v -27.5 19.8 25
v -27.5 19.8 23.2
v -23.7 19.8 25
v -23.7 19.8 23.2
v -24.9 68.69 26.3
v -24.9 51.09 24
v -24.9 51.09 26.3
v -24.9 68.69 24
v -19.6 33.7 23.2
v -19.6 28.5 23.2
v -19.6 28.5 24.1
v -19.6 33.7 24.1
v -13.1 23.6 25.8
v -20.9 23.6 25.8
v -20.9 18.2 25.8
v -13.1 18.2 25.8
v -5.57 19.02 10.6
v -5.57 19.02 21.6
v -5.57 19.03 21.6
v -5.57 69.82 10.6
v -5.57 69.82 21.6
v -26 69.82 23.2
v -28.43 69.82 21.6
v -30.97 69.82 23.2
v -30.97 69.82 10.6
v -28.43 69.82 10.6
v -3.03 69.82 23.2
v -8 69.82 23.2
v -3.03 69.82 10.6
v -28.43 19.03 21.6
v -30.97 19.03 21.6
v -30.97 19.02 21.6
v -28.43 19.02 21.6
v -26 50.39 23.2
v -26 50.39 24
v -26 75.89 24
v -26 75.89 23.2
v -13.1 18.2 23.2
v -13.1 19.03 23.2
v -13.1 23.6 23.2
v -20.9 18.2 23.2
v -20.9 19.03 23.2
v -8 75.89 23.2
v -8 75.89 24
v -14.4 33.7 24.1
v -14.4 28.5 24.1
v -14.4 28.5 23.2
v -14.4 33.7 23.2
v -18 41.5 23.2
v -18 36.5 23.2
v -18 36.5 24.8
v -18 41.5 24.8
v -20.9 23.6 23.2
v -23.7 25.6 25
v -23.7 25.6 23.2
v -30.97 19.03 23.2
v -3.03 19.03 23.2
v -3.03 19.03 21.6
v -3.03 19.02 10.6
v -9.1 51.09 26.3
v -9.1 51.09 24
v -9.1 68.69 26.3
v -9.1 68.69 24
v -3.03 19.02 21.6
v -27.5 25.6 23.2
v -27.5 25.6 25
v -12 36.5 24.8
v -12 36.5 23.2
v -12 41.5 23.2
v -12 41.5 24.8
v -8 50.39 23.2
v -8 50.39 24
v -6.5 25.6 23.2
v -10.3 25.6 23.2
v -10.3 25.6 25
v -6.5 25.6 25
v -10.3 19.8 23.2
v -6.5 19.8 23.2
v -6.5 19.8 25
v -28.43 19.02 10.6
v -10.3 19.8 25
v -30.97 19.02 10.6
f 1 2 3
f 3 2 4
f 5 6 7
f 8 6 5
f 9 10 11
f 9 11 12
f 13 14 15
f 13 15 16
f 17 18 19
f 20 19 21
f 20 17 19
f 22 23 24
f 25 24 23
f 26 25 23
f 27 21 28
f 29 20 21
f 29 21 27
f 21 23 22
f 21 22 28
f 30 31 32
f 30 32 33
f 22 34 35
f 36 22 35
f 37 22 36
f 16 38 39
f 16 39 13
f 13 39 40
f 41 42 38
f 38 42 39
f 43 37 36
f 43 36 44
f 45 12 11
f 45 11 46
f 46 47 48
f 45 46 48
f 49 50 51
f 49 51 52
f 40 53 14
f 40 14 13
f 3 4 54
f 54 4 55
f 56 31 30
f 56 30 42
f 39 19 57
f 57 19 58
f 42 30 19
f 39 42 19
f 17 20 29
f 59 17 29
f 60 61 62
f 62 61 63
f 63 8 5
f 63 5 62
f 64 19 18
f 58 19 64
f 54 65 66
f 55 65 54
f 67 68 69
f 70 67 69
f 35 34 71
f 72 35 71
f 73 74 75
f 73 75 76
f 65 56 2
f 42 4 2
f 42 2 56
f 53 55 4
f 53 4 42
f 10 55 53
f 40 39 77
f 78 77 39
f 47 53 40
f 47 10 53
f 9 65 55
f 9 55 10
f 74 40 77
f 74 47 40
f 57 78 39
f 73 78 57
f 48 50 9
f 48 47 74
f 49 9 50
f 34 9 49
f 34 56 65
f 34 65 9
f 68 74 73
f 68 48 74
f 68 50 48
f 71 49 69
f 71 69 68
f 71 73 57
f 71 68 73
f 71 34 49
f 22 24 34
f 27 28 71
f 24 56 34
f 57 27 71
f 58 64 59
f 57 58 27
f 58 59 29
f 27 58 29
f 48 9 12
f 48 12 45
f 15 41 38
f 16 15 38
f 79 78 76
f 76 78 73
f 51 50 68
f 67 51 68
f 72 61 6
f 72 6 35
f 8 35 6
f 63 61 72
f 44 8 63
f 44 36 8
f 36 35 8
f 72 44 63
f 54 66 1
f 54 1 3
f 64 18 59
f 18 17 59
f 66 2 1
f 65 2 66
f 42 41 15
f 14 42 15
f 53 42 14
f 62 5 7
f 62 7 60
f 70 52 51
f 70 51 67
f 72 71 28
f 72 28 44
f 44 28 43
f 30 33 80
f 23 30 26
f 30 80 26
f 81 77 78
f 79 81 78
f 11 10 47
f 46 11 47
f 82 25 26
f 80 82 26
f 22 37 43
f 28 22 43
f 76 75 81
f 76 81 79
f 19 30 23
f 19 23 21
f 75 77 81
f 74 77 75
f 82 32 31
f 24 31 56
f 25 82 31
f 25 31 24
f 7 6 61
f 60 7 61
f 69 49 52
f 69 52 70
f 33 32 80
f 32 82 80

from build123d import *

# Parameters (mm, degrees)
SKETCH1_W            = 2.54
SKETCH1_H            = 50.8
BOSS_EXTRUDE1_DEPTH  = 8.5
SKETCH2_W            = 2.54
SKETCH2_H            = 50.8
BOSS_EXTRUDE2_DEPTH  = 2.5
SKETCH3_W            = 2.54
SKETCH3_H            = 50.8
BOSS_EXTRUDE3_DEPTH  = 8.5
SKETCH4_W            = 2.54
SKETCH4_H            = 50.8
BOSS_EXTRUDE4_DEPTH  = 2.5
SKETCH5_W            = 27.94
SKETCH5_H            = 50.79
BOSS_EXTRUDE5_DEPTH  = 1.6
SKETCH6_W            = 18
SKETCH6_H            = 25.5
BOSS_EXTRUDE6_DEPTH  = 0.8
SKETCH7_W            = 15.8
SKETCH7_H            = 17.6
BOSS_EXTRUDE7_DEPTH  = 2.3
SKETCH8_W            = 7.8
SKETCH8_H            = 5.4
BOSS_EXTRUDE8_DEPTH  = 2.6
SKETCH9_W            = 3.8
SKETCH9_H            = 5.8
BOSS_EXTRUDE9_DEPTH  = 1.8
SKETCH10_W           = 3.8
SKETCH10_H           = 5.8
BOSS_EXTRUDE10_DEPTH = 1.8
SKETCH11_W           = 5.2
SKETCH11_H           = 5.2
BOSS_EXTRUDE11_DEPTH = 0.9
SKETCH12_W           = 6
SKETCH12_H           = 5
BOSS_EXTRUDE12_DEPTH = 1.6


with BuildPart() as part:
    # Sketch1 → Boss-Extrude1 (new body)
    with BuildSketch(Plane.XY.offset(10.6)):
        with Locations((-29.7, 44.42)):
            Rectangle(SKETCH1_W, SKETCH1_H)
    extrude(amount=BOSS_EXTRUDE1_DEPTH)

    # Sketch2 → Boss-Extrude2 (add)
    with BuildSketch(Plane.XY.offset(19.1)):
        with Locations((-29.7, 44.42)):
            Rectangle(SKETCH2_W, SKETCH2_H)
    extrude(amount=BOSS_EXTRUDE2_DEPTH)



with BuildPart() as body_2:
    # Sketch3 → Boss-Extrude3 (new body)
    with BuildSketch(Plane.XY.offset(10.6)):
        with Locations((-4.3, 44.42)):
            Rectangle(SKETCH3_W, SKETCH3_H)
    extrude(amount=BOSS_EXTRUDE3_DEPTH)

    # Sketch4 → Boss-Extrude4 (add)
    with BuildSketch(Plane.XY.offset(19.1)):
        with Locations((-4.3, 44.42)):
            Rectangle(SKETCH4_W, SKETCH4_H)
    extrude(amount=BOSS_EXTRUDE4_DEPTH)


with BuildPart() as part_1:
    add(part.part)

    add(body_2.part)  # Boss-Extrude5 merges body 2
    # Sketch5 → Boss-Extrude5 (add)
    with BuildSketch(Plane.XY.offset(21.6)):
        with Locations((-17, 44.425)):
            Rectangle(SKETCH5_W, SKETCH5_H)
    extrude(amount=BOSS_EXTRUDE5_DEPTH)

    # Sketch6 → Boss-Extrude6 (add)
    with BuildSketch(Plane.XY.offset(23.2)):
        with Locations((-17, 63.14)):
            Rectangle(SKETCH6_W, SKETCH6_H)
    extrude(amount=BOSS_EXTRUDE6_DEPTH)

    # Sketch7 → Boss-Extrude7 (add)
    with BuildSketch(Plane.XY.offset(24)):
        with Locations((-17, 59.89)):
            Rectangle(SKETCH7_W, SKETCH7_H)
    extrude(amount=BOSS_EXTRUDE7_DEPTH)

    # Sketch8 → Boss-Extrude8 (add)
    with BuildSketch(Plane.XY.offset(23.2)):
        with Locations((-17, 20.9)):
            Rectangle(SKETCH8_W, SKETCH8_H)
    extrude(amount=BOSS_EXTRUDE8_DEPTH)

    # Sketch9 → Boss-Extrude9 (add)
    with BuildSketch(Plane.XY.offset(23.2)):
        with Locations((-25.6, 22.7)):
            Rectangle(SKETCH9_W, SKETCH9_H)
    extrude(amount=BOSS_EXTRUDE9_DEPTH)

    # Sketch10 → Boss-Extrude10 (add)
    with BuildSketch(Plane.XY.offset(23.2)):
        with Locations((-8.4, 22.7)):
            Rectangle(SKETCH10_W, SKETCH10_H)
    extrude(amount=BOSS_EXTRUDE10_DEPTH)

    # Sketch11 → Boss-Extrude11 (add)
    with BuildSketch(Plane.XY.offset(23.2)):
        with Locations((-17, 31.1)):
            Rectangle(SKETCH11_W, SKETCH11_H)
    extrude(amount=BOSS_EXTRUDE11_DEPTH)

    # Sketch12 → Boss-Extrude12 (add)
    with BuildSketch(Plane.XY.offset(23.2)):
        with Locations((-15, 39)):
            Rectangle(SKETCH12_W, SKETCH12_H)
    extrude(amount=BOSS_EXTRUDE12_DEPTH)


solid = part_1.part
